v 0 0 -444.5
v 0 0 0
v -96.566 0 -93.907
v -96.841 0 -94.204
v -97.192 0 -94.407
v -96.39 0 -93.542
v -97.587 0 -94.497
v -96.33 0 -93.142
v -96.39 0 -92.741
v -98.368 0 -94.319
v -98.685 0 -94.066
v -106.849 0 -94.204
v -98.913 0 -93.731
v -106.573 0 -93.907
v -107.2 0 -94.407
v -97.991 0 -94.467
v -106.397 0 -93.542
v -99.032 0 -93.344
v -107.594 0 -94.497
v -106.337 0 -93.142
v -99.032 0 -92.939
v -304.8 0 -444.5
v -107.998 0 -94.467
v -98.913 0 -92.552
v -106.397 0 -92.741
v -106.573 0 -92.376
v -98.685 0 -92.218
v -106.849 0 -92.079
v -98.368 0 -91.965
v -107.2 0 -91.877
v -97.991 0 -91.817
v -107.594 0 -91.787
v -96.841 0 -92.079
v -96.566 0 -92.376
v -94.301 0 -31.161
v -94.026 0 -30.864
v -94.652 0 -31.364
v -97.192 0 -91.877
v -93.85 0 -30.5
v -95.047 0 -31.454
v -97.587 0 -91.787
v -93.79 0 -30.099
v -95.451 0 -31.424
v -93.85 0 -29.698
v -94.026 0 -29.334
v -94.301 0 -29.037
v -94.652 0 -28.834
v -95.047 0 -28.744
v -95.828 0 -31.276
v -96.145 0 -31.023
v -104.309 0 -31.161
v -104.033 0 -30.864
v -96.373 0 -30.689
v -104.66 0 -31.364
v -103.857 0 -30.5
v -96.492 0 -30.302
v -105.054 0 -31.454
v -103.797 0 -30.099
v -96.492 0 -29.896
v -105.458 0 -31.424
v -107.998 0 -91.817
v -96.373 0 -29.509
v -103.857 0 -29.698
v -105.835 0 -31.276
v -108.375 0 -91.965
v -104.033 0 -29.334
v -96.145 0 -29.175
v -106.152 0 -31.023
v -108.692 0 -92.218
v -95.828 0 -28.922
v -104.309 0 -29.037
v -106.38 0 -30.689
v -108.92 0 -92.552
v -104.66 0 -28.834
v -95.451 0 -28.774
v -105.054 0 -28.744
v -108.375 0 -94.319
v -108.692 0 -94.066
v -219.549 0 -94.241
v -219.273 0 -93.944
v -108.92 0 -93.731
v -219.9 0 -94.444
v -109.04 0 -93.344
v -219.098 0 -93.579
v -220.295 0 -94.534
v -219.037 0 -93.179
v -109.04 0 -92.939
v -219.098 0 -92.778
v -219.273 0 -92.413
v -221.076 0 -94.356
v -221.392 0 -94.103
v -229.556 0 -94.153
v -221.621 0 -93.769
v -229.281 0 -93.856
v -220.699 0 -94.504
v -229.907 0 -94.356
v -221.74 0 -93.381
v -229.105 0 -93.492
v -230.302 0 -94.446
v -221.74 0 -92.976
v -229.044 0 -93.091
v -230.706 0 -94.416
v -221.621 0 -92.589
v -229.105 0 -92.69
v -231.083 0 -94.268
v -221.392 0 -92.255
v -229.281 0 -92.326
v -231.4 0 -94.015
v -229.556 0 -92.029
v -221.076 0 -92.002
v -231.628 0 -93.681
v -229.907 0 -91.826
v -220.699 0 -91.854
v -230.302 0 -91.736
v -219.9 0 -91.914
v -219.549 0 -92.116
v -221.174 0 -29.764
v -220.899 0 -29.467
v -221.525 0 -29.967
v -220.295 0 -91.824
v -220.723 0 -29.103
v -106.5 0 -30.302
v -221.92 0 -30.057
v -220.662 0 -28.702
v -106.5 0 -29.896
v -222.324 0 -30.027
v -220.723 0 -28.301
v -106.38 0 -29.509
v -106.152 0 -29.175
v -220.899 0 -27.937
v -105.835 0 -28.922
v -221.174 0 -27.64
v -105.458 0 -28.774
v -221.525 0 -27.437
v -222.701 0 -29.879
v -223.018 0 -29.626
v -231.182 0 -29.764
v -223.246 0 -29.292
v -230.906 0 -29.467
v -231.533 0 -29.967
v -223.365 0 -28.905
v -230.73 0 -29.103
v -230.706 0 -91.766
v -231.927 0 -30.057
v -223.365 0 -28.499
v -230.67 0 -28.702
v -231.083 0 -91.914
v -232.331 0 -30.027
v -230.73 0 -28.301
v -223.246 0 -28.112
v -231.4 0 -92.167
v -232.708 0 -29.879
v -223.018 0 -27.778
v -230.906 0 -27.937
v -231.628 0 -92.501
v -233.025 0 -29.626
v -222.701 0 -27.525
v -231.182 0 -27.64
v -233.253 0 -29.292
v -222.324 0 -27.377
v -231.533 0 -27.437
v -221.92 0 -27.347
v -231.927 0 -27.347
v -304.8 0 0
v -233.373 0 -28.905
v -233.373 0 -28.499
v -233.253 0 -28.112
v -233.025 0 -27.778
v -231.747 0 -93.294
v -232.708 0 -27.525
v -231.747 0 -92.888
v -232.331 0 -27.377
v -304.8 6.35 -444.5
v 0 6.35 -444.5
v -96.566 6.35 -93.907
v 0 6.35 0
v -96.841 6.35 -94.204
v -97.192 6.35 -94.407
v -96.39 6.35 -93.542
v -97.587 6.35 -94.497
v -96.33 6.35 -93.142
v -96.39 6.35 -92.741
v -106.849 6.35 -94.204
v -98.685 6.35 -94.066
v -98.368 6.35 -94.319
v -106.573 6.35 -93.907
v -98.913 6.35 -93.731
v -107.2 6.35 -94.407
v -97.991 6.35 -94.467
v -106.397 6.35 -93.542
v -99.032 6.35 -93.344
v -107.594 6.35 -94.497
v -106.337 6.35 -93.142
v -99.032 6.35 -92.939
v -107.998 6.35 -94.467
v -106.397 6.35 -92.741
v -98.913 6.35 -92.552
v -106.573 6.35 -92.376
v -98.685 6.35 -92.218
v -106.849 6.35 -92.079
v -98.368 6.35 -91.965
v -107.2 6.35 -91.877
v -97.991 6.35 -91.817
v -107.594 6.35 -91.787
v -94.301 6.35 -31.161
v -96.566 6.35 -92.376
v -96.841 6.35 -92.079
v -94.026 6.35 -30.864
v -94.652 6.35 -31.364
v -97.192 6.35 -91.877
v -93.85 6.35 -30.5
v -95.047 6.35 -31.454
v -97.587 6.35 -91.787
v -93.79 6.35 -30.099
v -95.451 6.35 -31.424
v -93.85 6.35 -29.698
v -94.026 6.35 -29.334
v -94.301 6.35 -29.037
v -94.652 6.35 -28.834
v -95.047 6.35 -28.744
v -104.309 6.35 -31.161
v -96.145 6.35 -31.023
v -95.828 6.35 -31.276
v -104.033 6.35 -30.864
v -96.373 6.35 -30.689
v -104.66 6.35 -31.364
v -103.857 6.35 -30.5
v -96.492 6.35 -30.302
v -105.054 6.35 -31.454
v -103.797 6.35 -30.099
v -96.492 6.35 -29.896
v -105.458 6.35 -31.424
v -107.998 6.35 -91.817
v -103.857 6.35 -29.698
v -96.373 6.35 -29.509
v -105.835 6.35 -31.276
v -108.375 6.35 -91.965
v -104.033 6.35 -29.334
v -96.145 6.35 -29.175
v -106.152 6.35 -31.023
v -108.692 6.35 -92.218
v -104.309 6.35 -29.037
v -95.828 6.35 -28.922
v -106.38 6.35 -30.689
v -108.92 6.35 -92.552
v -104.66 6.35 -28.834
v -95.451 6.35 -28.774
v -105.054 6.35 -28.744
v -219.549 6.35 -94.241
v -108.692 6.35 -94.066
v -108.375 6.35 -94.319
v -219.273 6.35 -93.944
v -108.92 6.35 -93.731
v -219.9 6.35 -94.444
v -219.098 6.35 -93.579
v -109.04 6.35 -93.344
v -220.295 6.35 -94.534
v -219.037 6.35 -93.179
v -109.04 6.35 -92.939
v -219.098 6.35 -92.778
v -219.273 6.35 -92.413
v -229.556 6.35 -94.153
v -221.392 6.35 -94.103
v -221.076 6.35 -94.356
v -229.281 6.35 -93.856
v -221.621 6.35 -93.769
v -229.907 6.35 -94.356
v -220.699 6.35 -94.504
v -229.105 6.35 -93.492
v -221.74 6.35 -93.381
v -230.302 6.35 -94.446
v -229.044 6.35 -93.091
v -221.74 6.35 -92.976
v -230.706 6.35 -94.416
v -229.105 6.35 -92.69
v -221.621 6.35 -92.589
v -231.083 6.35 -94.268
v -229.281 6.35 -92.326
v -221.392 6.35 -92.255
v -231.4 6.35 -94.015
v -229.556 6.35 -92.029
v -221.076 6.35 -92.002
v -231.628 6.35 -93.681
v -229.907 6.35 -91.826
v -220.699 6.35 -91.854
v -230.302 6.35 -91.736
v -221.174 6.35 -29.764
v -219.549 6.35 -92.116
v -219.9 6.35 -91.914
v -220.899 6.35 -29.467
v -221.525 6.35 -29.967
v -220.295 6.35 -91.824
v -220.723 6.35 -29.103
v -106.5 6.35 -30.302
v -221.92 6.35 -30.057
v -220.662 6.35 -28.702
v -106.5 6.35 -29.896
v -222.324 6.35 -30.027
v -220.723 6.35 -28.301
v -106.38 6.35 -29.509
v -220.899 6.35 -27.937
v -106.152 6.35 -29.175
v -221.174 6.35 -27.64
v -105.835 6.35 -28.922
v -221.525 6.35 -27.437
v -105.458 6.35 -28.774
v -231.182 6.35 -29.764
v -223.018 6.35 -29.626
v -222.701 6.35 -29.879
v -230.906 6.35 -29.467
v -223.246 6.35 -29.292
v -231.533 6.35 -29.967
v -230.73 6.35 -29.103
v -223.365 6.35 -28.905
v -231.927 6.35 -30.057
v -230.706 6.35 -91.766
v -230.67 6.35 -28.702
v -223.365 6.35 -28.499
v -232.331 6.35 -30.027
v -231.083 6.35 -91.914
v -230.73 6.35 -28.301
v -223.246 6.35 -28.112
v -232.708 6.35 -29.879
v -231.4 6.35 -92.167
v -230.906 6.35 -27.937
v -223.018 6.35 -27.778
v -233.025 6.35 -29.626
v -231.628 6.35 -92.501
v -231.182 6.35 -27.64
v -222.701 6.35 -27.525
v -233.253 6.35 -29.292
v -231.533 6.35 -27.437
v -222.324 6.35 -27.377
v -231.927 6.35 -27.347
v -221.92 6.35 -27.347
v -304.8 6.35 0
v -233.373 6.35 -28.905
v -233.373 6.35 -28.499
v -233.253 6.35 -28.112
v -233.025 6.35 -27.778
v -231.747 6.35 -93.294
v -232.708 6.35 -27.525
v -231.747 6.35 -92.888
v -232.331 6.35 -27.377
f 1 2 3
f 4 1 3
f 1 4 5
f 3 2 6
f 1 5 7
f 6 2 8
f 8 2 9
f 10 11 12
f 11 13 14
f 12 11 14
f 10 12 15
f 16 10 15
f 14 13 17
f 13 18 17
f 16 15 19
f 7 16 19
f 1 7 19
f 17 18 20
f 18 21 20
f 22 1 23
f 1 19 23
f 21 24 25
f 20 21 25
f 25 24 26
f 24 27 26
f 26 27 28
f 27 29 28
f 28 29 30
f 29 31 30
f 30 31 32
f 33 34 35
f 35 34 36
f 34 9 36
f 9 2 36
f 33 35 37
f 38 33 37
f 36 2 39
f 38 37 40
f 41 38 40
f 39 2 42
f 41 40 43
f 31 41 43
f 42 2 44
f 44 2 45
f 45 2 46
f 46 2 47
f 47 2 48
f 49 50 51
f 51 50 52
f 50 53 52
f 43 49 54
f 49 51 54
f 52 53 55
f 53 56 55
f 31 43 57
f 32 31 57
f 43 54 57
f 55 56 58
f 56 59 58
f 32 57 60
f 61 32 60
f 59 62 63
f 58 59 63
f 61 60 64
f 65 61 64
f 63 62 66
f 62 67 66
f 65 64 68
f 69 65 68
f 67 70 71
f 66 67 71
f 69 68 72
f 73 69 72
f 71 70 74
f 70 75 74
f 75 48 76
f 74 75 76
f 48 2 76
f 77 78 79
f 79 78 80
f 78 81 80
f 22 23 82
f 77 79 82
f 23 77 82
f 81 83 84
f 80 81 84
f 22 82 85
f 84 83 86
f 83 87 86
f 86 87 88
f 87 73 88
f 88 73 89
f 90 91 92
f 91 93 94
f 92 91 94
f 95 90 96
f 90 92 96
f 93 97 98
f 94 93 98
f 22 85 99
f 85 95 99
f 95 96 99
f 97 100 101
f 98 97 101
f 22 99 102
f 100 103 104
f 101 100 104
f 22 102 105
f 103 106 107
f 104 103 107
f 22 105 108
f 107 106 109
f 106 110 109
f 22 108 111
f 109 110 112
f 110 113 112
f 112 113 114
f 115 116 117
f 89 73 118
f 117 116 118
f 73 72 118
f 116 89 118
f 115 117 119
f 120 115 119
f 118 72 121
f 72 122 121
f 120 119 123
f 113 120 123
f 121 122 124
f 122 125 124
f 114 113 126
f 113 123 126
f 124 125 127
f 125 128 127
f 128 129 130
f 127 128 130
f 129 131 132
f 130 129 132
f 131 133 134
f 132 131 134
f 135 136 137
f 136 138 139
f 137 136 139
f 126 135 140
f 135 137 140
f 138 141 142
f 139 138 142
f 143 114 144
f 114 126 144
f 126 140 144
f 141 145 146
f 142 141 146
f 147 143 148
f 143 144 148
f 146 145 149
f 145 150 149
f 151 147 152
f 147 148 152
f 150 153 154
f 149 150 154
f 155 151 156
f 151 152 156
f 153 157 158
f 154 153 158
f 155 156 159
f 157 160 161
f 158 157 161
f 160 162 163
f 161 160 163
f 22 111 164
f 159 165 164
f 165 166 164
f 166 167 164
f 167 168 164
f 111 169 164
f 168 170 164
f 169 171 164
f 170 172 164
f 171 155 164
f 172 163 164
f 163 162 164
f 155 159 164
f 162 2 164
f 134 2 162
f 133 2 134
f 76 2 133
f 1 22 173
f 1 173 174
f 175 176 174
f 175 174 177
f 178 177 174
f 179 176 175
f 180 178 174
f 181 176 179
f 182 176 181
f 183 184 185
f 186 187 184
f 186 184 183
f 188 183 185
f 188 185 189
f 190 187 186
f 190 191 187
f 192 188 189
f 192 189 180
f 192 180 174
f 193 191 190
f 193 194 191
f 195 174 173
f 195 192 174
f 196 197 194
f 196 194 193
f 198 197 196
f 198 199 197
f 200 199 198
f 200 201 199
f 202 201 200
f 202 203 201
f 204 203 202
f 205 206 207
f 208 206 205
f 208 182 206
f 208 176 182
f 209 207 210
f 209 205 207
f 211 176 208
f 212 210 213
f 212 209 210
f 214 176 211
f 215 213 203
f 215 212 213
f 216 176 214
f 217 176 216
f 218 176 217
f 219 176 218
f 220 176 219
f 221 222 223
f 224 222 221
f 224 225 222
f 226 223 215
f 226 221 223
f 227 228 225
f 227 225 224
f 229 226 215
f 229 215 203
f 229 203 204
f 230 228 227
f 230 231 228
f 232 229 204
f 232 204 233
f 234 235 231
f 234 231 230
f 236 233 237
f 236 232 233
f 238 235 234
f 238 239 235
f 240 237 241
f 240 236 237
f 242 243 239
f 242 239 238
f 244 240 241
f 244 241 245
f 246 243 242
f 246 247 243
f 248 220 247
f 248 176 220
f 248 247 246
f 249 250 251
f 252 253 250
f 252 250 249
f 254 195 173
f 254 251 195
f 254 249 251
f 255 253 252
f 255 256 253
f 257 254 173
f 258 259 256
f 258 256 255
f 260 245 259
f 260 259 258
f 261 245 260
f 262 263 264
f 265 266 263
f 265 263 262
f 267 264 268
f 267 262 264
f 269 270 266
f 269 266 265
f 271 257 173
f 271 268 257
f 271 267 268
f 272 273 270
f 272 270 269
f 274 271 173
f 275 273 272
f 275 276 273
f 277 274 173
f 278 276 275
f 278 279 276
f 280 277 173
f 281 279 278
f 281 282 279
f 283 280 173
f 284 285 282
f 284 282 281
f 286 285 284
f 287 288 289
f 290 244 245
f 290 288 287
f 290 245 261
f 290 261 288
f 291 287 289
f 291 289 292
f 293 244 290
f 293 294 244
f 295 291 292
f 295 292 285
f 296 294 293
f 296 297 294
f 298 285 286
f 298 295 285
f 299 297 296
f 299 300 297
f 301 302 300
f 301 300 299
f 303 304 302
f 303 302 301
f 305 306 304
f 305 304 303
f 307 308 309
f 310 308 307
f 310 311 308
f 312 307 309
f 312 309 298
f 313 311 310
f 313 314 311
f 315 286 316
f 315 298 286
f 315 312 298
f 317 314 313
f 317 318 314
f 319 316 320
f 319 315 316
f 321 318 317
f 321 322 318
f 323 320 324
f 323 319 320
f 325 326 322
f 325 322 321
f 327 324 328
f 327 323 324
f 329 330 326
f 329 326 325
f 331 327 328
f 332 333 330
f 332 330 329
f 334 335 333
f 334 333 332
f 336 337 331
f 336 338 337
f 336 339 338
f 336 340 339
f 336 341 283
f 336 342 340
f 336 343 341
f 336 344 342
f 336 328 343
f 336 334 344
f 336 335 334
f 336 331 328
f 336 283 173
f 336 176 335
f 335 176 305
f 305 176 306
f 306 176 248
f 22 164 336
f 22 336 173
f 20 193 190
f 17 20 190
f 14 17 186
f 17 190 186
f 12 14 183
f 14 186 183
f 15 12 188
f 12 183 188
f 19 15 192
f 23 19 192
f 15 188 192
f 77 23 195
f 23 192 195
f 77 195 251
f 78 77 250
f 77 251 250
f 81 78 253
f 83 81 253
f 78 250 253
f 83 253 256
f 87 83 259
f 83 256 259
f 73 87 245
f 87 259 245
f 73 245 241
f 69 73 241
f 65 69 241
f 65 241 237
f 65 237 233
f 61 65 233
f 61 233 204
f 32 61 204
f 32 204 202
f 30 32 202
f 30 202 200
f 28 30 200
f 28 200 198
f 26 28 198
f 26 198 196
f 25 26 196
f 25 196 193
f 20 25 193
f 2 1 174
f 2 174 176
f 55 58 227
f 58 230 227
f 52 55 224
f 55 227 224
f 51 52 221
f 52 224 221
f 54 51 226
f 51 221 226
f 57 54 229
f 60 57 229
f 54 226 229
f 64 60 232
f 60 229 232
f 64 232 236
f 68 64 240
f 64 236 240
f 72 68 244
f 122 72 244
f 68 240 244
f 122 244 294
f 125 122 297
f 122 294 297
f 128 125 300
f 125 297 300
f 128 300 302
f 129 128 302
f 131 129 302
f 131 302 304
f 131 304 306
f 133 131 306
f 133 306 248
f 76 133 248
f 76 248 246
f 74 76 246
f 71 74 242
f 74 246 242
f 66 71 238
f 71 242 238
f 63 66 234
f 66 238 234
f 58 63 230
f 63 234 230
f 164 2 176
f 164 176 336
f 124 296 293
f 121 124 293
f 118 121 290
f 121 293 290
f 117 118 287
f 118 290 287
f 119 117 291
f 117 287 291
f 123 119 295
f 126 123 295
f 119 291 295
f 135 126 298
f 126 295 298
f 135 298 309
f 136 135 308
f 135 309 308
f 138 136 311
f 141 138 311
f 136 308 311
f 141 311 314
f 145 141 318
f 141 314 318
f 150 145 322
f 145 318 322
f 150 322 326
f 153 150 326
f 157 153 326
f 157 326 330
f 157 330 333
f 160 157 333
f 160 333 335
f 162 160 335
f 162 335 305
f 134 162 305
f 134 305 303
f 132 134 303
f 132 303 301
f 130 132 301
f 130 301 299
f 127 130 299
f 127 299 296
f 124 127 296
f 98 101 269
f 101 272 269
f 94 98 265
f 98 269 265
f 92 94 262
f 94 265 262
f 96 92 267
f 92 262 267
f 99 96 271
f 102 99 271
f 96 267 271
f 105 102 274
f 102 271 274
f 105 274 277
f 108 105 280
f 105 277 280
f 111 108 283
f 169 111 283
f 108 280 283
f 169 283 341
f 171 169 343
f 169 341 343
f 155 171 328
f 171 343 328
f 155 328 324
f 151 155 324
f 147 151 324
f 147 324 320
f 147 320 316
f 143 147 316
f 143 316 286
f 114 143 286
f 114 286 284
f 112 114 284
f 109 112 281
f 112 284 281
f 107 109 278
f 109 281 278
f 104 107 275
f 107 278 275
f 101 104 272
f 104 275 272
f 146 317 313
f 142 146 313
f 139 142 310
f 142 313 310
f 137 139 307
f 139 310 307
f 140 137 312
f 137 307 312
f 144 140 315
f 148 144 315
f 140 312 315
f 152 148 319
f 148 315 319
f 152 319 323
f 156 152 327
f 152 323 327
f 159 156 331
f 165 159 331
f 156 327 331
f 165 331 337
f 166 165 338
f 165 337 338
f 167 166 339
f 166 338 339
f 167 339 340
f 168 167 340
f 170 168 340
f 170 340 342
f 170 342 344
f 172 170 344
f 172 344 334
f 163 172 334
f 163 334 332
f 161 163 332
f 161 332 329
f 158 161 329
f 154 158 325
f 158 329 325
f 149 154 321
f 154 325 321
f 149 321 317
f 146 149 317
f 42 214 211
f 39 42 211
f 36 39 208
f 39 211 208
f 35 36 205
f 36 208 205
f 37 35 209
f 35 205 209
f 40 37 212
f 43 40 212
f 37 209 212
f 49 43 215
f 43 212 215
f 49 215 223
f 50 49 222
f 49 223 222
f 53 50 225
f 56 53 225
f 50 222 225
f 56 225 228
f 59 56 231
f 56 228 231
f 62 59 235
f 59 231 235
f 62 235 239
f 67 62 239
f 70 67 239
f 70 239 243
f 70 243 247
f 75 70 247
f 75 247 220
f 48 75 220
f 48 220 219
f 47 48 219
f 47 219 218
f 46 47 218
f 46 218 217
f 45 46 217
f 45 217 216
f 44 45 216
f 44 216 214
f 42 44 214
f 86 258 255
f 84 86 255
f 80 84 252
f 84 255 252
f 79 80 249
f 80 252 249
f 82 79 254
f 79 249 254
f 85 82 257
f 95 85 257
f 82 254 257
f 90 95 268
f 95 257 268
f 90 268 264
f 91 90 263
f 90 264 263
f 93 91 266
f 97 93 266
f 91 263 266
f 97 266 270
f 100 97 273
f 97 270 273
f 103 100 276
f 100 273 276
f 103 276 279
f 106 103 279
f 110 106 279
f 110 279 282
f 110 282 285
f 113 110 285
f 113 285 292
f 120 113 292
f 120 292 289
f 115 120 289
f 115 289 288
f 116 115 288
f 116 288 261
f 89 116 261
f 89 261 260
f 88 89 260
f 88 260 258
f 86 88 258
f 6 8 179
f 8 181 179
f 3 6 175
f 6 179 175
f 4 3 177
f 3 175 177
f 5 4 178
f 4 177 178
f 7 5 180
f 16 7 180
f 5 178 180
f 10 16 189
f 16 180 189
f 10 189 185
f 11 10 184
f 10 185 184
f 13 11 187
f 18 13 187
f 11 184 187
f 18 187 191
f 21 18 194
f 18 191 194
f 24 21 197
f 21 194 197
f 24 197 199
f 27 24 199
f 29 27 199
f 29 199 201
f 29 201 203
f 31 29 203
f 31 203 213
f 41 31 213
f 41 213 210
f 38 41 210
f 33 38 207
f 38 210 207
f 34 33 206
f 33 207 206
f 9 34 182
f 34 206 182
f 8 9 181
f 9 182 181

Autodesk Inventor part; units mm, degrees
ref_plane "YZ Plane" through (0, 0, 0) normal (1, 0, 0) x (0, 1, 0)
ref_plane "XZ Plane" through (0, 0, 0) normal (0, 1, 0) x (-1, 0, 0)
ref_plane "XY Plane" through (0, 0, 0) normal (0, 0, 1) x (1, 0, 0)
sketch "Sketch1" plane through (0, 0, 0) normal (0, 1, 0) x (-1, 0, 0)
  line L0 (0, 0) -> (304.8, 0)
  line L1 (304.8, 0) -> (304.8, -444.5)
  line L2 (304.8, -444.5) -> (0, -444.5)
  line L3 (0, -444.5) -> (0, 0)
  dimension "d0" = 304.8
  dimension "d1" = 444.5
extrude "Extrusion1" add sketch "Sketch1" along normal blind 6.35
sketch "Sketch2" plane through (0, 6.35, 0) normal (0, 1, 0) x (1, 0, 0)
  circle A0 centre (-95.1484, 30.099) radius 1.3589
  circle A1 centre (-105.156, 30.099) radius 1.3589
  line L0 (-304.8, 0) -> (0, 0) projected
  line L1 (0, 0) -> (0, 444.5) projected
  dimension "d4" = 2.7178
  dimension "d5" = 2.7178
  dimension "d7" = 95.1484
  dimension "d8" = 10.0076
  dimension "d9" = 30.099
  dimension "d37" = 30.099
extrude "Extrusion2" cut sketch "Sketch2" against normal blind 25.4
sketch "Sketch3" plane through (0, 6.35, 0) normal (0, 1, 0) x (1, 0, 0)
  circle A0 centre (-107.696, 93.1418) radius 1.3589
  circle A1 centre (-97.6884, 93.1418) radius 1.3589
  circle A2 centre (-95.1484, 30.099) radius 1.3589 projected
  circle A3 centre (-105.156, 30.099) radius 1.3589 projected
  line L0 (0, 0) -> (0, 444.5) projected
  dimension "d12" = 2.7178
  dimension "d13" = 2.7178
  dimension "d14" = 63.0428
  dimension "d15" = 63.0428
  dimension "d16" = 10.0076
  dimension "d17" = 97.6884
extrude "Extrusion3" cut sketch "Sketch3" against normal blind 25.4 contours A0 | A1
sketch "Sketch4" plane through (0, 6.35, 0) normal (0, 1, 0) x (1, 0, 0)
  circle A0 centre (-230.4034, 93.091) radius 1.3589
  circle A1 centre (-220.3962, 93.1789) radius 1.3589
  line L0 (-304.8, 444.5) -> (-304.8, 0) projected
  line L1 (-304.8, 0) -> (0, 0) projected
  dimension "d20" = 2.7178
  dimension "d21" = 2.7178
  dimension "d22" = 10.0076
  dimension "d23" = 74.3966
  dimension "d24" = 93.091
extrude "Extrusion4" cut sketch "Sketch4" against normal blind 25.4
sketch "Sketch5" plane through (0, 6.35, 0) normal (0, 1, 0) x (1, 0, 0)
  circle A0 centre (-232.029, 28.702) radius 1.3589
  circle A1 centre (-222.0214, 28.702) radius 1.3589
  line L0 (-304.8, 0) -> (0, 0) projected
  line L1 (-304.8, 444.5) -> (-304.8, 0) projected
  line L2 (0, 0) -> (0, 444.5) projected
  dimension "d27" = 2.7178
  dimension "d28" = 2.7178
  dimension "d31" = 28.702
  dimension "d32" = 10.0076
  dimension "d36" = 222.0214
  dimension "d38" = 28.702
extrude "Extrusion5" cut sketch "Sketch5" against normal blind 25.4
properties part number "main plate"
